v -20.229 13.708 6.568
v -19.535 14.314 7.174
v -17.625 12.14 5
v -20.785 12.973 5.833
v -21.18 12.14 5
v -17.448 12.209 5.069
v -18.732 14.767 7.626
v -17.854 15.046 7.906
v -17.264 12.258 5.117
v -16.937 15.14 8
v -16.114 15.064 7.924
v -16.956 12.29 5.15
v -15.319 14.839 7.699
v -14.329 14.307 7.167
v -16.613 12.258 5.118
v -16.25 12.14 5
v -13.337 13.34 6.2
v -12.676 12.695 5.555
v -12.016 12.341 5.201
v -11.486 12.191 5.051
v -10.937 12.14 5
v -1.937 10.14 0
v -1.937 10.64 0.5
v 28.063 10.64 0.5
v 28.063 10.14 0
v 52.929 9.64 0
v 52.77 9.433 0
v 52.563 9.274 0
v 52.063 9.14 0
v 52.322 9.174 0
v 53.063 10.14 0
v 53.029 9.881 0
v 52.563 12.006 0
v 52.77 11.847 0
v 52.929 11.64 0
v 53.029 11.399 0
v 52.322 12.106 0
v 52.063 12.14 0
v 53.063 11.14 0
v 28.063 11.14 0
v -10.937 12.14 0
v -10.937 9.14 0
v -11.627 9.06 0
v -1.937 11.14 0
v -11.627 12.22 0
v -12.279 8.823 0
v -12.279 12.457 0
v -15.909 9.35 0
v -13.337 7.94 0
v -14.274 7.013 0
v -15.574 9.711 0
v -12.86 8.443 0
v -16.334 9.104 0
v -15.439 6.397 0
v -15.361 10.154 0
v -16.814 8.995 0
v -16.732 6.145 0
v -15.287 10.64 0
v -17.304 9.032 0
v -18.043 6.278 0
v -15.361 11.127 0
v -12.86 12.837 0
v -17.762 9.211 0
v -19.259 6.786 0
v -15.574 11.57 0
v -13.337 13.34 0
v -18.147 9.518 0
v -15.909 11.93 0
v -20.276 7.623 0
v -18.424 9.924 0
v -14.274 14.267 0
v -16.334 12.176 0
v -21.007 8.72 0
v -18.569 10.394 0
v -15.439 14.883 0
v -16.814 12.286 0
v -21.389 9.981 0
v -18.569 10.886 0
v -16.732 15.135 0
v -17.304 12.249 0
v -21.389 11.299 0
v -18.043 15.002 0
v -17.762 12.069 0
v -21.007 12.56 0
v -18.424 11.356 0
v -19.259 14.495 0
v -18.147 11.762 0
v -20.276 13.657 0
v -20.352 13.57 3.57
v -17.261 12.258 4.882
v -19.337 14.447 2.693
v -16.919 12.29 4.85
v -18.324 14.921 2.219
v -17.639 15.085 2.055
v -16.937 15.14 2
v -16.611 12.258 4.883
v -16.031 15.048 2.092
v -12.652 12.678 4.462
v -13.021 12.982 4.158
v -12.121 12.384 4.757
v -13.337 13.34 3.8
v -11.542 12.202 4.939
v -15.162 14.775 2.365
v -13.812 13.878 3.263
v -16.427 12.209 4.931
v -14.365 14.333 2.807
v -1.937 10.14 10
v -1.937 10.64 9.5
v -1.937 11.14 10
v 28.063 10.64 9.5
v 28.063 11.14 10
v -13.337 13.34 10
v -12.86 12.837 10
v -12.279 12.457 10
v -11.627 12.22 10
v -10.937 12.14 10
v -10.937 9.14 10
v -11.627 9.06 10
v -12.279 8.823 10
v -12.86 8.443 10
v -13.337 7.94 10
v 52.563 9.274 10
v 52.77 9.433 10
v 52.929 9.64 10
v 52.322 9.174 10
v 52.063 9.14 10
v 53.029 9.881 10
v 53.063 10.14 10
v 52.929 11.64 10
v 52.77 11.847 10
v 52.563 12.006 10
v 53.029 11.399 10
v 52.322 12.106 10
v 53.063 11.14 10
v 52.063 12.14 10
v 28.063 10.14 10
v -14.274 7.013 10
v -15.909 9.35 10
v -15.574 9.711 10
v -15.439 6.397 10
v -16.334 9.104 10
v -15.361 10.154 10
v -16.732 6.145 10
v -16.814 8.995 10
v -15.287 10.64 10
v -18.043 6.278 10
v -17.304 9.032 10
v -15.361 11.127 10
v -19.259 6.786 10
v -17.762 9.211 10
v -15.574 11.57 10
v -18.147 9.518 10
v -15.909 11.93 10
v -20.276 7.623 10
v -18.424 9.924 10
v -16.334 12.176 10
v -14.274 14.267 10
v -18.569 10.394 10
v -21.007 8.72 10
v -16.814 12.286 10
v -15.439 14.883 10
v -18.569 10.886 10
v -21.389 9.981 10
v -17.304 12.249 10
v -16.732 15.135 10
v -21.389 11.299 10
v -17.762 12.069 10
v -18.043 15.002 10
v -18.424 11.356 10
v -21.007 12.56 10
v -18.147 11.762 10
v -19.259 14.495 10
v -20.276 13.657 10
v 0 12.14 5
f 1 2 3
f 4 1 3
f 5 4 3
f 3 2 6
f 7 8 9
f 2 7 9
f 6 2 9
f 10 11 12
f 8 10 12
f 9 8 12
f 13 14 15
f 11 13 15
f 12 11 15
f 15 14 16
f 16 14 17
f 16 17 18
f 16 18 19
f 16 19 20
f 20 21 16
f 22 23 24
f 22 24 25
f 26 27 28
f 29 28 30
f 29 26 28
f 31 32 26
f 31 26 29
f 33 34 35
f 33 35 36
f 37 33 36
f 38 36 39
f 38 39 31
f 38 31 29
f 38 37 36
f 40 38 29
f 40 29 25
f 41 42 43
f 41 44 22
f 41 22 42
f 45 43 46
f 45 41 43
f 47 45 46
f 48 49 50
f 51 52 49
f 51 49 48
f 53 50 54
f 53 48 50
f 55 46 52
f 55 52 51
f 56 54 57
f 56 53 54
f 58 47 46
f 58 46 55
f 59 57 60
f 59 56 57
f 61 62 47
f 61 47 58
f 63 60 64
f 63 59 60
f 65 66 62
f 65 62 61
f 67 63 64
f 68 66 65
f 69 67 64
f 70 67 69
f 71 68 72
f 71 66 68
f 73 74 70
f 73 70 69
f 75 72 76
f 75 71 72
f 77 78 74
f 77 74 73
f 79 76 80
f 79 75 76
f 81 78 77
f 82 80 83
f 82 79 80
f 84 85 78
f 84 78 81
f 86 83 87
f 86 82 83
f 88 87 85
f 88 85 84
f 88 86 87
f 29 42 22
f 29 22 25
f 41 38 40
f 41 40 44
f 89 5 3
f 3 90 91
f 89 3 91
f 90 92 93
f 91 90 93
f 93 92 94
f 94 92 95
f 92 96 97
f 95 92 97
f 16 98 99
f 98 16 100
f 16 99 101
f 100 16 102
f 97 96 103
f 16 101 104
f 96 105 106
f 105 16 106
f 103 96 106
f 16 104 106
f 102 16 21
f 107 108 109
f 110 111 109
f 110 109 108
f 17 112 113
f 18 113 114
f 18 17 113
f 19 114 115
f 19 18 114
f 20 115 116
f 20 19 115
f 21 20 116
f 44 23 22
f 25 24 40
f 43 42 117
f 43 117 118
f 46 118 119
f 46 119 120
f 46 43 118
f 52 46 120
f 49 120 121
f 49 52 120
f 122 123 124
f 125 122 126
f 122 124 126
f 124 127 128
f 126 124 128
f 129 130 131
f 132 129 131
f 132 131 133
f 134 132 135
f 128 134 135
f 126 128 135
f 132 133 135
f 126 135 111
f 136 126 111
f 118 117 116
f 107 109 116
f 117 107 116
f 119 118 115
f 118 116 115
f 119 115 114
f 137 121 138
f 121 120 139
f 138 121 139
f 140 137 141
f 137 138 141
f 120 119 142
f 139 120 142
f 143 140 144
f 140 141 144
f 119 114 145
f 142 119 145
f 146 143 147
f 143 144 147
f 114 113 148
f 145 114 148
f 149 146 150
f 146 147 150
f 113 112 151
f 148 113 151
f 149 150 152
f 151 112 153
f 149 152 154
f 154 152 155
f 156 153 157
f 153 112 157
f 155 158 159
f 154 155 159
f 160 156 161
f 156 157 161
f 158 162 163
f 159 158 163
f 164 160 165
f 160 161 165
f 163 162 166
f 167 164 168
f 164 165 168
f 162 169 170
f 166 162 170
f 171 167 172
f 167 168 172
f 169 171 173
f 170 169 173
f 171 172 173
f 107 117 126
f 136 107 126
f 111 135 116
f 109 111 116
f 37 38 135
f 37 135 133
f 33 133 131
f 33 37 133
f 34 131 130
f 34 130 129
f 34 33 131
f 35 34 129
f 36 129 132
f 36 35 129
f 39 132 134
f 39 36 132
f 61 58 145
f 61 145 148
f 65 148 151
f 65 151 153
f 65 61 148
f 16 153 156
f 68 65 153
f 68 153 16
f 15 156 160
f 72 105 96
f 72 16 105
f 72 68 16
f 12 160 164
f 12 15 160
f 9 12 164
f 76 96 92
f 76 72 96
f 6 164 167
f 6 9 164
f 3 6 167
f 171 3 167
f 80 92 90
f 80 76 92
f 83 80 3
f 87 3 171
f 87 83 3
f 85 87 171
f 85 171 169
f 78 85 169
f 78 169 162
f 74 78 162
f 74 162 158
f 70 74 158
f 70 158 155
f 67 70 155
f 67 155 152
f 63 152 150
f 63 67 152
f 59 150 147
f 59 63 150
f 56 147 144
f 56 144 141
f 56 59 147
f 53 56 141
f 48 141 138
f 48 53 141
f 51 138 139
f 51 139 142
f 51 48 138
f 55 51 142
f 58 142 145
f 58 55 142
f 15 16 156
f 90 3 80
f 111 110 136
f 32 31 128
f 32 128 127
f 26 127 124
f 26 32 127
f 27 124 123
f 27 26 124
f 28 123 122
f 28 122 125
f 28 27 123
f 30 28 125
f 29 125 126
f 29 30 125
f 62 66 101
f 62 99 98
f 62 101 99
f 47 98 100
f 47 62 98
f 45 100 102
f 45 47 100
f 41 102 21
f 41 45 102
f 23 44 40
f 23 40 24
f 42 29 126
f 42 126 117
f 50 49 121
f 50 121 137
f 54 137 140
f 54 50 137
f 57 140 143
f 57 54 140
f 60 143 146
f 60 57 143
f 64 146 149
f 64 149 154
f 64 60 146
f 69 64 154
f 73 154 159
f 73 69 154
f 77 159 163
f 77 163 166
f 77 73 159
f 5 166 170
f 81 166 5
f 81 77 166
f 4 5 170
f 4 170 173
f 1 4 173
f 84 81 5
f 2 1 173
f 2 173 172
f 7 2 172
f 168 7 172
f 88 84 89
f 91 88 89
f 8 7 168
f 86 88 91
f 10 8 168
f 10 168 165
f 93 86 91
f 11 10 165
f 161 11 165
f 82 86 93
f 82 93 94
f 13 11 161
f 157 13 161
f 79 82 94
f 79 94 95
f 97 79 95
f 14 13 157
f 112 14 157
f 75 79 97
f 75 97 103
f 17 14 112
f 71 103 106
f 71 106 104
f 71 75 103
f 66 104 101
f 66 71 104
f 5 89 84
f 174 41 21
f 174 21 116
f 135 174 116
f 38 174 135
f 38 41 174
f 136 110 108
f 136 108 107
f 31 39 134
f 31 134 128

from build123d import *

# Parameters (mm, degrees)
SKETCH1_R           = 1.65
BOSS_EXTRUDE1_DEPTH = 10
CUT_EXTRUDE1_DEPTH  = 29
CUT_EXTRUDE2_START  = -25
CUT_EXTRUDE2_DEPTH  = 30


with BuildPart() as part:
    # Sketch1 → Boss-Extrude1 (new body)
    with BuildSketch(Plane.XY):
        with BuildLine():
            Line((52.062696878, 9.140164993), (-10.937303122, 9.140164993))
            ThreePointArc((-10.937303122, 9.140164993), (-12.278943909, 8.823446566), (-13.337303122, 7.940164993))
            ThreePointArc((-13.337303122, 7.940164993), (-21.437303122, 10.640164993), (-13.337303122, 13.340164993))
            ThreePointArc((-13.337303122, 13.340164993), (-12.278943909, 12.45688342), (-10.937303122, 12.140164993))
            Line((-10.937303122, 12.140164993), (52.062696878, 12.140164993))
            ThreePointArc((52.062696878, 12.140164993), (52.769803659, 11.847271774), (53.062696878, 11.140164993))
            Line((53.062696878, 11.140164993), (53.062696878, 10.140164993))
            ThreePointArc((53.062696878, 10.140164993), (52.769803659, 9.433058211), (52.062696878, 9.140164993))
        make_face()
        with Locations((-16.937303122, 10.640164993)):
            Circle(SKETCH1_R, mode=Mode.SUBTRACT)
    extrude(amount=BOSS_EXTRUDE1_DEPTH)

    # Sketch7 → Cut-Extrude1 (cut)
    with BuildSketch(Plane(origin=(0, 0, 0), x_dir=(0, 0, -1), z_dir=(1, 0, 0))):
        Polygon((-8, 15.140164993), (-5, 12.140164993), (-2, 15.140164993), align=None)
    extrude(amount=-CUT_EXTRUDE1_DEPTH, mode=Mode.SUBTRACT)

    # Sketch8 → Cut-Extrude2 (cut)
    with BuildSketch(Plane(origin=(53.062696878, 0, 0), x_dir=(0, 0, -1), z_dir=(1, 0, 0)).offset(CUT_EXTRUDE2_START)):
        Polygon((0, 11.140164993), (-0.5, 10.640164993), (0, 10.140164993), align=None)
    cut_extrude2 = extrude(amount=-CUT_EXTRUDE2_DEPTH, mode=Mode.SUBTRACT)

    # Mirror1: Cut-Extrude2 across plane
    add(cut_extrude2.mirror(Plane(origin=(0, 0, 5), x_dir=(1, 0, 0), z_dir=(0, 0, -1))), mode=Mode.SUBTRACT)


solid = part.part
